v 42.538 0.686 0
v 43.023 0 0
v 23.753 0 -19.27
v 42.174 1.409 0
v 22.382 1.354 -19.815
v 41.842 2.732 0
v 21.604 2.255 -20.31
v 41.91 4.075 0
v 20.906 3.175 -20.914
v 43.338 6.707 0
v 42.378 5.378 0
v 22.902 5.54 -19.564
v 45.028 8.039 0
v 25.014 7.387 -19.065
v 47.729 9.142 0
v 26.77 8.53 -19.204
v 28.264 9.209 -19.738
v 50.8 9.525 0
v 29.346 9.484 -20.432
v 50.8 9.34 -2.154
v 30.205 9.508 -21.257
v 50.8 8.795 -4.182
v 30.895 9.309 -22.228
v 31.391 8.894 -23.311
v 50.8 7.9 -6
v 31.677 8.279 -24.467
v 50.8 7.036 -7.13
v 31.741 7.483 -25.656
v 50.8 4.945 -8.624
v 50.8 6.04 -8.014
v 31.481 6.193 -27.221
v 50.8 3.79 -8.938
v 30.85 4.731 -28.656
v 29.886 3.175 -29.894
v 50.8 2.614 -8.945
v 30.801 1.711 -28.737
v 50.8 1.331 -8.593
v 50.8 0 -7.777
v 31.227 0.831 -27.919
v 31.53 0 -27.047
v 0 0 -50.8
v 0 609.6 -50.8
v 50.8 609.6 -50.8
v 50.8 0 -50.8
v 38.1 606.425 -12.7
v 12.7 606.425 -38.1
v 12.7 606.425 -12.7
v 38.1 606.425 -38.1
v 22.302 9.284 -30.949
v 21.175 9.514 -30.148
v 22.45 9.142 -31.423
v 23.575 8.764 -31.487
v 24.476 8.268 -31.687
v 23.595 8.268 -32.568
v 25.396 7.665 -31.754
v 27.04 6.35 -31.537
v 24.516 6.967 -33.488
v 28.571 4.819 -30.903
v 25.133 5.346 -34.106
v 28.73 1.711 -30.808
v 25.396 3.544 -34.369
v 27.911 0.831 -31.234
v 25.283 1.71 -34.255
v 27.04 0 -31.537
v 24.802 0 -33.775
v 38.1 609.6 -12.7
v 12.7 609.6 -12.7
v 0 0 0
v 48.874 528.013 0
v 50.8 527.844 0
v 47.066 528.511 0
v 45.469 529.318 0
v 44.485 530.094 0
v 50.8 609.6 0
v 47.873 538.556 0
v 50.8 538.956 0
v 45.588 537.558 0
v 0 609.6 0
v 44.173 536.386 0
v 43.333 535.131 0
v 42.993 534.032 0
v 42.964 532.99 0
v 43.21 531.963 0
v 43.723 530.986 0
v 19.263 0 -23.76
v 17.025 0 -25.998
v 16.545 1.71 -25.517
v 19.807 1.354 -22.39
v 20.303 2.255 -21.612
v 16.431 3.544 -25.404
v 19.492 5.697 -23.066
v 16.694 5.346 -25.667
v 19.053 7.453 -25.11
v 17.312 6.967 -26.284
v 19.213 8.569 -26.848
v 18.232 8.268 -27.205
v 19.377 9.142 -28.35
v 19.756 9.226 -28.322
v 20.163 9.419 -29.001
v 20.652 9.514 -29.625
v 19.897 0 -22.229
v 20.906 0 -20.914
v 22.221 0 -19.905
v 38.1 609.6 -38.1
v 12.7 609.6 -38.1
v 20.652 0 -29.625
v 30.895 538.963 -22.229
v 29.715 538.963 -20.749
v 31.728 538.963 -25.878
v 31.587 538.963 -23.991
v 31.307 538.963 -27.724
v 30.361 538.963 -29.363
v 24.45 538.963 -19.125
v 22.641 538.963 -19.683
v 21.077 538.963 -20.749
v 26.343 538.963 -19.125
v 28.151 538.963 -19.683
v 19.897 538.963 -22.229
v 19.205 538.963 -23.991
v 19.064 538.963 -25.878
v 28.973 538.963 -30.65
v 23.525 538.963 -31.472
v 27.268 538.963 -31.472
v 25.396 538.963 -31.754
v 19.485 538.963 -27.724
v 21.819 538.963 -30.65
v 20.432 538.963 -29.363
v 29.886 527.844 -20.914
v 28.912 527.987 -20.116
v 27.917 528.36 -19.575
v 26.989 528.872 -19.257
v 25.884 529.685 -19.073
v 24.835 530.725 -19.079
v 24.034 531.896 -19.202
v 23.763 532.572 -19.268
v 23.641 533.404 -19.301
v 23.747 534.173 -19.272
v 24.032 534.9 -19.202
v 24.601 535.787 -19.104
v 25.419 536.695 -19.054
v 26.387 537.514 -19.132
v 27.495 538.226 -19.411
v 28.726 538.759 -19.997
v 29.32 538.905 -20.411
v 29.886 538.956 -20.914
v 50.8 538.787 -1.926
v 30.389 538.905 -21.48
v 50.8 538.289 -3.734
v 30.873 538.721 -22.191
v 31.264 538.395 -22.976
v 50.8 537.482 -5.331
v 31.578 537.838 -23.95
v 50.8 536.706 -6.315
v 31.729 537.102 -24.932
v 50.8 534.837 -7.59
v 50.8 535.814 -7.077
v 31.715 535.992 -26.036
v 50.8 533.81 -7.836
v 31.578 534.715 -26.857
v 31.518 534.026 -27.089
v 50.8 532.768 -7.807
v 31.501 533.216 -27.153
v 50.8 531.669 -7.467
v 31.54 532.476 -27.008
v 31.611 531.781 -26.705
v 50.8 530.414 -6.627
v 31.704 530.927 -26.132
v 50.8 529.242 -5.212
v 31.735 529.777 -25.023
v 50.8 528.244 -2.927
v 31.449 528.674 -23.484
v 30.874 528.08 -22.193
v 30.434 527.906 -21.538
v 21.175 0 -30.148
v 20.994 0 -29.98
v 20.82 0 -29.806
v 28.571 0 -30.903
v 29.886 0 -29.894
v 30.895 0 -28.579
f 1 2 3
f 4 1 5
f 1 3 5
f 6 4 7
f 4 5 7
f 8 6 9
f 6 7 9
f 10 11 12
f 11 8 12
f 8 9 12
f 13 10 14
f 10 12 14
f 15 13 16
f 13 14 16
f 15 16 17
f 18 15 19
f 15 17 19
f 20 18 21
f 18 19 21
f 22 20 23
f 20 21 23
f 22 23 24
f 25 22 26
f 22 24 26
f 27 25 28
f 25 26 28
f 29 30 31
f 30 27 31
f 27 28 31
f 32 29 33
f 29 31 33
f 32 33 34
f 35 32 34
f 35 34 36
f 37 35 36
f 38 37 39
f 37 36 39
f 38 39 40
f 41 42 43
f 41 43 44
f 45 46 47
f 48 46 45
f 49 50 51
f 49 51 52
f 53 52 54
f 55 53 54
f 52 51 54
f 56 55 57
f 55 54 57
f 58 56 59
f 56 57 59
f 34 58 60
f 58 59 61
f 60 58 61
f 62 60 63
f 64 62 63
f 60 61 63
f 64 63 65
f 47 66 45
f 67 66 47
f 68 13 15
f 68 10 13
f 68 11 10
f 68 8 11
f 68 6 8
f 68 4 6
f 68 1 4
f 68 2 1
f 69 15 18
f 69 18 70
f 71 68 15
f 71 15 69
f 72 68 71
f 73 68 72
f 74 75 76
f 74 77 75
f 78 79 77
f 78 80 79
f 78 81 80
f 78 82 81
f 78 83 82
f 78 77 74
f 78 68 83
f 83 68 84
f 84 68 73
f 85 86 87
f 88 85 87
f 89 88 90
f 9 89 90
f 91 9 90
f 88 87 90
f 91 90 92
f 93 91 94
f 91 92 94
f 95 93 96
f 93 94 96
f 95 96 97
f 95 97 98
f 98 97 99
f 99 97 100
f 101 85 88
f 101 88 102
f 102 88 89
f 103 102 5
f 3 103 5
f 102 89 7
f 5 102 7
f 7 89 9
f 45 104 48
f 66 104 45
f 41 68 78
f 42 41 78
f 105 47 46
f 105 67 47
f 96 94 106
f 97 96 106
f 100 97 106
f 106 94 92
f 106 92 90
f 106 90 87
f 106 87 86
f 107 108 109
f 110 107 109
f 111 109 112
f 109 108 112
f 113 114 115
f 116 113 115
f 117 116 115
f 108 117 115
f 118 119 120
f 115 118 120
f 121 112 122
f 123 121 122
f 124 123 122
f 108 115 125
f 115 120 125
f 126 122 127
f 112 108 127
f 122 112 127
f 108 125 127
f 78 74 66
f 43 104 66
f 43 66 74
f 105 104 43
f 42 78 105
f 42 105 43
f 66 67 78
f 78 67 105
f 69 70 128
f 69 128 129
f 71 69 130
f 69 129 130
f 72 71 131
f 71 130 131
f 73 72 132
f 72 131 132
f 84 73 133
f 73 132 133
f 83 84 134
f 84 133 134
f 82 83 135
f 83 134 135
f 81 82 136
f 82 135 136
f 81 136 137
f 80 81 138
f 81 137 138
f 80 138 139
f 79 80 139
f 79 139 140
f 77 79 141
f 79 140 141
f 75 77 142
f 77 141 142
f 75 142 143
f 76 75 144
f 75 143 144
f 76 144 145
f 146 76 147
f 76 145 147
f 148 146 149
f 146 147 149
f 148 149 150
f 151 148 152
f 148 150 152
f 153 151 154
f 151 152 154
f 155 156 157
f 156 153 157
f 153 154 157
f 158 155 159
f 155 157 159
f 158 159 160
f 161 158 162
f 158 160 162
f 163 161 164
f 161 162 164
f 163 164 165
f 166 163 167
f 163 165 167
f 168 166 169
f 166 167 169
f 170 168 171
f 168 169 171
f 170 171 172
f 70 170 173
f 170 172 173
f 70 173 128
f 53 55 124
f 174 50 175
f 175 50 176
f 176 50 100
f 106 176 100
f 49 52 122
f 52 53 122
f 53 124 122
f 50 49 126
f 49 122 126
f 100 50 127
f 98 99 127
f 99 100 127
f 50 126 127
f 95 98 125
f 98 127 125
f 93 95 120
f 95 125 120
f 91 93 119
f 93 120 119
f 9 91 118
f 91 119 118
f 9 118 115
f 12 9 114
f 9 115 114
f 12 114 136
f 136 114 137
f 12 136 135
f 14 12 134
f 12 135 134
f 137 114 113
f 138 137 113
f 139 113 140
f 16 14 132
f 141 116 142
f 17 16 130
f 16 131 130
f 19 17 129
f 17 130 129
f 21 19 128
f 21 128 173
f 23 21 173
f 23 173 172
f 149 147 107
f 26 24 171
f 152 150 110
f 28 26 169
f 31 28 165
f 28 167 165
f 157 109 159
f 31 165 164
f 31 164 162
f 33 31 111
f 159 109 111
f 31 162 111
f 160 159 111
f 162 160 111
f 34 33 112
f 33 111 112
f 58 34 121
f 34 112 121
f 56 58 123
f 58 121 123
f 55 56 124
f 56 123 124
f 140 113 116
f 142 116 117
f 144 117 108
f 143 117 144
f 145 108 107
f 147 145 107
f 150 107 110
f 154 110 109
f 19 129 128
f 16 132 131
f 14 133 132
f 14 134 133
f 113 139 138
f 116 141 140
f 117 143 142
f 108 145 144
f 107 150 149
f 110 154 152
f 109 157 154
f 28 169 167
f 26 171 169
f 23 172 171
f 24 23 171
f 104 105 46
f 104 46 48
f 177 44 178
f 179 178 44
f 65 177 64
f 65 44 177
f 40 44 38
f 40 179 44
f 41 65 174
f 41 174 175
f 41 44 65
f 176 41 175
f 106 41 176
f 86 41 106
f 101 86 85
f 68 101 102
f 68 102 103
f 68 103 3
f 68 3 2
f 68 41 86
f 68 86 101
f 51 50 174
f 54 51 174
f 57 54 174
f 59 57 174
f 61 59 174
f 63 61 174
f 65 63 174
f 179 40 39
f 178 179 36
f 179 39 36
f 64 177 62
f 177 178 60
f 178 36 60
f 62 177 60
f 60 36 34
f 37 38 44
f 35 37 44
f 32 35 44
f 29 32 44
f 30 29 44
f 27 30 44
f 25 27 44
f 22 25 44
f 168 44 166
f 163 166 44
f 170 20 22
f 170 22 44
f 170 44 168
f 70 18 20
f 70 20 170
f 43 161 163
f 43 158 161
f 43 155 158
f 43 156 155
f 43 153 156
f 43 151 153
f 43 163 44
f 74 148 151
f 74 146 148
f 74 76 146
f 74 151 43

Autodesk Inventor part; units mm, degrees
ref_plane "YZ Plane" through (0, 0, 0) normal (1, 0, 0) x (0, 1, 0)
ref_plane "XZ Plane" through (0, 0, 0) normal (0, 1, 0) x (-1, 0, 0)
sketch "Sketch1" plane through (0, 0, 0) normal (1, 0, 0) x (0, 1, 0)
  line L0 (0, 0) -> (609.6, 0)
  line L1 (609.6, 0) -> (609.6, -50.8)
  line L2 (609.6, -50.8) -> (0, -50.8)
  line L3 (0, -50.8) -> (0, 0)
  dimension "d0" = 609.6
  dimension "d1" = 50.8
extrude "Extrusion1" add sketch "Sketch1" along normal blind 50.8
ref_plane "Work Plane2" through (50.8, 0, 0) normal (0.7071, 0, 0.7071) x (0, -1, 0)
sketch "Sketch4" plane through (50.8, 0, 0) normal (0.7071, 0, 0.7071) x (0, -1, 0)
  line L0 (-609.6, 0) -> (-533.4, 0)
  line L1 (0, 0) -> (-3.175, 0)
  point P0 (0, -35.921)
  dimension "d8" = 76.2
  dimension "d16" = 3.175
hole "Hole1" at (50.8, 533.4, 0) direction (-0.7071, 0, -0.7071) diameter 11.1125 depth 35.9156
sketch "Sketch6" plane through (50.8, 0, 0) normal (0.7071, 0, 0.7071) x (0, -1, 0)
  line L0 (0, -35.921) -> (0, 0) projected
  line L1 (0, 0) -> (-3.175, 0)
  line L2 (-609.6, 0) -> (0, 0) projected
  dimension "d17" = 3.175
hole "Hole2" at (50.8, 3.175, 0) direction (-0.7071, 0, -0.7071) diameter 12.7 depth 42.2656
sketch "Sketch10" plane through (0, 0, -50.8) normal (0, -1, 0) x (1, 0, 0)
  line L0 (0, 0) -> (25.3962, 25.3962)
  line L1 (0, 0) -> (50.8, 0) projected
  point P0 (0, 50.8)
  point P1 (50.8, 50.8)
  dimension "d34" = 35.9156
  dimension "d35" = 45
hole "Hole4" at (25.3962, 0, -25.4038) direction (0, 1, 0) diameter 12.7 depth 538.9626
sketch "Sketch11" plane through (0, 609.6, 0) normal (0, 1, 0) x (1, 0, 0)
  line L0 (12.7, 38.1) -> (38.1, 38.1)
  line L1 (38.1, 38.1) -> (38.1, 12.7)
  line L2 (38.1, 12.7) -> (12.7, 12.7)
  line L3 (12.7, 12.7) -> (12.7, 38.1)
  line L4 (0, 50.8) -> (0, 0) projected
  line L5 (0, 50.8) -> (50.8, 50.8) projected
  dimension "d43" = 25.4
  dimension "d44" = 25.4
  dimension "d45" = 12.7
  dimension "d46" = 12.7
extrude "Extrusion2" cut sketch "Sketch11" against normal blind 3.175
properties part number "LegOutlet" material "Wood (Birch)"
